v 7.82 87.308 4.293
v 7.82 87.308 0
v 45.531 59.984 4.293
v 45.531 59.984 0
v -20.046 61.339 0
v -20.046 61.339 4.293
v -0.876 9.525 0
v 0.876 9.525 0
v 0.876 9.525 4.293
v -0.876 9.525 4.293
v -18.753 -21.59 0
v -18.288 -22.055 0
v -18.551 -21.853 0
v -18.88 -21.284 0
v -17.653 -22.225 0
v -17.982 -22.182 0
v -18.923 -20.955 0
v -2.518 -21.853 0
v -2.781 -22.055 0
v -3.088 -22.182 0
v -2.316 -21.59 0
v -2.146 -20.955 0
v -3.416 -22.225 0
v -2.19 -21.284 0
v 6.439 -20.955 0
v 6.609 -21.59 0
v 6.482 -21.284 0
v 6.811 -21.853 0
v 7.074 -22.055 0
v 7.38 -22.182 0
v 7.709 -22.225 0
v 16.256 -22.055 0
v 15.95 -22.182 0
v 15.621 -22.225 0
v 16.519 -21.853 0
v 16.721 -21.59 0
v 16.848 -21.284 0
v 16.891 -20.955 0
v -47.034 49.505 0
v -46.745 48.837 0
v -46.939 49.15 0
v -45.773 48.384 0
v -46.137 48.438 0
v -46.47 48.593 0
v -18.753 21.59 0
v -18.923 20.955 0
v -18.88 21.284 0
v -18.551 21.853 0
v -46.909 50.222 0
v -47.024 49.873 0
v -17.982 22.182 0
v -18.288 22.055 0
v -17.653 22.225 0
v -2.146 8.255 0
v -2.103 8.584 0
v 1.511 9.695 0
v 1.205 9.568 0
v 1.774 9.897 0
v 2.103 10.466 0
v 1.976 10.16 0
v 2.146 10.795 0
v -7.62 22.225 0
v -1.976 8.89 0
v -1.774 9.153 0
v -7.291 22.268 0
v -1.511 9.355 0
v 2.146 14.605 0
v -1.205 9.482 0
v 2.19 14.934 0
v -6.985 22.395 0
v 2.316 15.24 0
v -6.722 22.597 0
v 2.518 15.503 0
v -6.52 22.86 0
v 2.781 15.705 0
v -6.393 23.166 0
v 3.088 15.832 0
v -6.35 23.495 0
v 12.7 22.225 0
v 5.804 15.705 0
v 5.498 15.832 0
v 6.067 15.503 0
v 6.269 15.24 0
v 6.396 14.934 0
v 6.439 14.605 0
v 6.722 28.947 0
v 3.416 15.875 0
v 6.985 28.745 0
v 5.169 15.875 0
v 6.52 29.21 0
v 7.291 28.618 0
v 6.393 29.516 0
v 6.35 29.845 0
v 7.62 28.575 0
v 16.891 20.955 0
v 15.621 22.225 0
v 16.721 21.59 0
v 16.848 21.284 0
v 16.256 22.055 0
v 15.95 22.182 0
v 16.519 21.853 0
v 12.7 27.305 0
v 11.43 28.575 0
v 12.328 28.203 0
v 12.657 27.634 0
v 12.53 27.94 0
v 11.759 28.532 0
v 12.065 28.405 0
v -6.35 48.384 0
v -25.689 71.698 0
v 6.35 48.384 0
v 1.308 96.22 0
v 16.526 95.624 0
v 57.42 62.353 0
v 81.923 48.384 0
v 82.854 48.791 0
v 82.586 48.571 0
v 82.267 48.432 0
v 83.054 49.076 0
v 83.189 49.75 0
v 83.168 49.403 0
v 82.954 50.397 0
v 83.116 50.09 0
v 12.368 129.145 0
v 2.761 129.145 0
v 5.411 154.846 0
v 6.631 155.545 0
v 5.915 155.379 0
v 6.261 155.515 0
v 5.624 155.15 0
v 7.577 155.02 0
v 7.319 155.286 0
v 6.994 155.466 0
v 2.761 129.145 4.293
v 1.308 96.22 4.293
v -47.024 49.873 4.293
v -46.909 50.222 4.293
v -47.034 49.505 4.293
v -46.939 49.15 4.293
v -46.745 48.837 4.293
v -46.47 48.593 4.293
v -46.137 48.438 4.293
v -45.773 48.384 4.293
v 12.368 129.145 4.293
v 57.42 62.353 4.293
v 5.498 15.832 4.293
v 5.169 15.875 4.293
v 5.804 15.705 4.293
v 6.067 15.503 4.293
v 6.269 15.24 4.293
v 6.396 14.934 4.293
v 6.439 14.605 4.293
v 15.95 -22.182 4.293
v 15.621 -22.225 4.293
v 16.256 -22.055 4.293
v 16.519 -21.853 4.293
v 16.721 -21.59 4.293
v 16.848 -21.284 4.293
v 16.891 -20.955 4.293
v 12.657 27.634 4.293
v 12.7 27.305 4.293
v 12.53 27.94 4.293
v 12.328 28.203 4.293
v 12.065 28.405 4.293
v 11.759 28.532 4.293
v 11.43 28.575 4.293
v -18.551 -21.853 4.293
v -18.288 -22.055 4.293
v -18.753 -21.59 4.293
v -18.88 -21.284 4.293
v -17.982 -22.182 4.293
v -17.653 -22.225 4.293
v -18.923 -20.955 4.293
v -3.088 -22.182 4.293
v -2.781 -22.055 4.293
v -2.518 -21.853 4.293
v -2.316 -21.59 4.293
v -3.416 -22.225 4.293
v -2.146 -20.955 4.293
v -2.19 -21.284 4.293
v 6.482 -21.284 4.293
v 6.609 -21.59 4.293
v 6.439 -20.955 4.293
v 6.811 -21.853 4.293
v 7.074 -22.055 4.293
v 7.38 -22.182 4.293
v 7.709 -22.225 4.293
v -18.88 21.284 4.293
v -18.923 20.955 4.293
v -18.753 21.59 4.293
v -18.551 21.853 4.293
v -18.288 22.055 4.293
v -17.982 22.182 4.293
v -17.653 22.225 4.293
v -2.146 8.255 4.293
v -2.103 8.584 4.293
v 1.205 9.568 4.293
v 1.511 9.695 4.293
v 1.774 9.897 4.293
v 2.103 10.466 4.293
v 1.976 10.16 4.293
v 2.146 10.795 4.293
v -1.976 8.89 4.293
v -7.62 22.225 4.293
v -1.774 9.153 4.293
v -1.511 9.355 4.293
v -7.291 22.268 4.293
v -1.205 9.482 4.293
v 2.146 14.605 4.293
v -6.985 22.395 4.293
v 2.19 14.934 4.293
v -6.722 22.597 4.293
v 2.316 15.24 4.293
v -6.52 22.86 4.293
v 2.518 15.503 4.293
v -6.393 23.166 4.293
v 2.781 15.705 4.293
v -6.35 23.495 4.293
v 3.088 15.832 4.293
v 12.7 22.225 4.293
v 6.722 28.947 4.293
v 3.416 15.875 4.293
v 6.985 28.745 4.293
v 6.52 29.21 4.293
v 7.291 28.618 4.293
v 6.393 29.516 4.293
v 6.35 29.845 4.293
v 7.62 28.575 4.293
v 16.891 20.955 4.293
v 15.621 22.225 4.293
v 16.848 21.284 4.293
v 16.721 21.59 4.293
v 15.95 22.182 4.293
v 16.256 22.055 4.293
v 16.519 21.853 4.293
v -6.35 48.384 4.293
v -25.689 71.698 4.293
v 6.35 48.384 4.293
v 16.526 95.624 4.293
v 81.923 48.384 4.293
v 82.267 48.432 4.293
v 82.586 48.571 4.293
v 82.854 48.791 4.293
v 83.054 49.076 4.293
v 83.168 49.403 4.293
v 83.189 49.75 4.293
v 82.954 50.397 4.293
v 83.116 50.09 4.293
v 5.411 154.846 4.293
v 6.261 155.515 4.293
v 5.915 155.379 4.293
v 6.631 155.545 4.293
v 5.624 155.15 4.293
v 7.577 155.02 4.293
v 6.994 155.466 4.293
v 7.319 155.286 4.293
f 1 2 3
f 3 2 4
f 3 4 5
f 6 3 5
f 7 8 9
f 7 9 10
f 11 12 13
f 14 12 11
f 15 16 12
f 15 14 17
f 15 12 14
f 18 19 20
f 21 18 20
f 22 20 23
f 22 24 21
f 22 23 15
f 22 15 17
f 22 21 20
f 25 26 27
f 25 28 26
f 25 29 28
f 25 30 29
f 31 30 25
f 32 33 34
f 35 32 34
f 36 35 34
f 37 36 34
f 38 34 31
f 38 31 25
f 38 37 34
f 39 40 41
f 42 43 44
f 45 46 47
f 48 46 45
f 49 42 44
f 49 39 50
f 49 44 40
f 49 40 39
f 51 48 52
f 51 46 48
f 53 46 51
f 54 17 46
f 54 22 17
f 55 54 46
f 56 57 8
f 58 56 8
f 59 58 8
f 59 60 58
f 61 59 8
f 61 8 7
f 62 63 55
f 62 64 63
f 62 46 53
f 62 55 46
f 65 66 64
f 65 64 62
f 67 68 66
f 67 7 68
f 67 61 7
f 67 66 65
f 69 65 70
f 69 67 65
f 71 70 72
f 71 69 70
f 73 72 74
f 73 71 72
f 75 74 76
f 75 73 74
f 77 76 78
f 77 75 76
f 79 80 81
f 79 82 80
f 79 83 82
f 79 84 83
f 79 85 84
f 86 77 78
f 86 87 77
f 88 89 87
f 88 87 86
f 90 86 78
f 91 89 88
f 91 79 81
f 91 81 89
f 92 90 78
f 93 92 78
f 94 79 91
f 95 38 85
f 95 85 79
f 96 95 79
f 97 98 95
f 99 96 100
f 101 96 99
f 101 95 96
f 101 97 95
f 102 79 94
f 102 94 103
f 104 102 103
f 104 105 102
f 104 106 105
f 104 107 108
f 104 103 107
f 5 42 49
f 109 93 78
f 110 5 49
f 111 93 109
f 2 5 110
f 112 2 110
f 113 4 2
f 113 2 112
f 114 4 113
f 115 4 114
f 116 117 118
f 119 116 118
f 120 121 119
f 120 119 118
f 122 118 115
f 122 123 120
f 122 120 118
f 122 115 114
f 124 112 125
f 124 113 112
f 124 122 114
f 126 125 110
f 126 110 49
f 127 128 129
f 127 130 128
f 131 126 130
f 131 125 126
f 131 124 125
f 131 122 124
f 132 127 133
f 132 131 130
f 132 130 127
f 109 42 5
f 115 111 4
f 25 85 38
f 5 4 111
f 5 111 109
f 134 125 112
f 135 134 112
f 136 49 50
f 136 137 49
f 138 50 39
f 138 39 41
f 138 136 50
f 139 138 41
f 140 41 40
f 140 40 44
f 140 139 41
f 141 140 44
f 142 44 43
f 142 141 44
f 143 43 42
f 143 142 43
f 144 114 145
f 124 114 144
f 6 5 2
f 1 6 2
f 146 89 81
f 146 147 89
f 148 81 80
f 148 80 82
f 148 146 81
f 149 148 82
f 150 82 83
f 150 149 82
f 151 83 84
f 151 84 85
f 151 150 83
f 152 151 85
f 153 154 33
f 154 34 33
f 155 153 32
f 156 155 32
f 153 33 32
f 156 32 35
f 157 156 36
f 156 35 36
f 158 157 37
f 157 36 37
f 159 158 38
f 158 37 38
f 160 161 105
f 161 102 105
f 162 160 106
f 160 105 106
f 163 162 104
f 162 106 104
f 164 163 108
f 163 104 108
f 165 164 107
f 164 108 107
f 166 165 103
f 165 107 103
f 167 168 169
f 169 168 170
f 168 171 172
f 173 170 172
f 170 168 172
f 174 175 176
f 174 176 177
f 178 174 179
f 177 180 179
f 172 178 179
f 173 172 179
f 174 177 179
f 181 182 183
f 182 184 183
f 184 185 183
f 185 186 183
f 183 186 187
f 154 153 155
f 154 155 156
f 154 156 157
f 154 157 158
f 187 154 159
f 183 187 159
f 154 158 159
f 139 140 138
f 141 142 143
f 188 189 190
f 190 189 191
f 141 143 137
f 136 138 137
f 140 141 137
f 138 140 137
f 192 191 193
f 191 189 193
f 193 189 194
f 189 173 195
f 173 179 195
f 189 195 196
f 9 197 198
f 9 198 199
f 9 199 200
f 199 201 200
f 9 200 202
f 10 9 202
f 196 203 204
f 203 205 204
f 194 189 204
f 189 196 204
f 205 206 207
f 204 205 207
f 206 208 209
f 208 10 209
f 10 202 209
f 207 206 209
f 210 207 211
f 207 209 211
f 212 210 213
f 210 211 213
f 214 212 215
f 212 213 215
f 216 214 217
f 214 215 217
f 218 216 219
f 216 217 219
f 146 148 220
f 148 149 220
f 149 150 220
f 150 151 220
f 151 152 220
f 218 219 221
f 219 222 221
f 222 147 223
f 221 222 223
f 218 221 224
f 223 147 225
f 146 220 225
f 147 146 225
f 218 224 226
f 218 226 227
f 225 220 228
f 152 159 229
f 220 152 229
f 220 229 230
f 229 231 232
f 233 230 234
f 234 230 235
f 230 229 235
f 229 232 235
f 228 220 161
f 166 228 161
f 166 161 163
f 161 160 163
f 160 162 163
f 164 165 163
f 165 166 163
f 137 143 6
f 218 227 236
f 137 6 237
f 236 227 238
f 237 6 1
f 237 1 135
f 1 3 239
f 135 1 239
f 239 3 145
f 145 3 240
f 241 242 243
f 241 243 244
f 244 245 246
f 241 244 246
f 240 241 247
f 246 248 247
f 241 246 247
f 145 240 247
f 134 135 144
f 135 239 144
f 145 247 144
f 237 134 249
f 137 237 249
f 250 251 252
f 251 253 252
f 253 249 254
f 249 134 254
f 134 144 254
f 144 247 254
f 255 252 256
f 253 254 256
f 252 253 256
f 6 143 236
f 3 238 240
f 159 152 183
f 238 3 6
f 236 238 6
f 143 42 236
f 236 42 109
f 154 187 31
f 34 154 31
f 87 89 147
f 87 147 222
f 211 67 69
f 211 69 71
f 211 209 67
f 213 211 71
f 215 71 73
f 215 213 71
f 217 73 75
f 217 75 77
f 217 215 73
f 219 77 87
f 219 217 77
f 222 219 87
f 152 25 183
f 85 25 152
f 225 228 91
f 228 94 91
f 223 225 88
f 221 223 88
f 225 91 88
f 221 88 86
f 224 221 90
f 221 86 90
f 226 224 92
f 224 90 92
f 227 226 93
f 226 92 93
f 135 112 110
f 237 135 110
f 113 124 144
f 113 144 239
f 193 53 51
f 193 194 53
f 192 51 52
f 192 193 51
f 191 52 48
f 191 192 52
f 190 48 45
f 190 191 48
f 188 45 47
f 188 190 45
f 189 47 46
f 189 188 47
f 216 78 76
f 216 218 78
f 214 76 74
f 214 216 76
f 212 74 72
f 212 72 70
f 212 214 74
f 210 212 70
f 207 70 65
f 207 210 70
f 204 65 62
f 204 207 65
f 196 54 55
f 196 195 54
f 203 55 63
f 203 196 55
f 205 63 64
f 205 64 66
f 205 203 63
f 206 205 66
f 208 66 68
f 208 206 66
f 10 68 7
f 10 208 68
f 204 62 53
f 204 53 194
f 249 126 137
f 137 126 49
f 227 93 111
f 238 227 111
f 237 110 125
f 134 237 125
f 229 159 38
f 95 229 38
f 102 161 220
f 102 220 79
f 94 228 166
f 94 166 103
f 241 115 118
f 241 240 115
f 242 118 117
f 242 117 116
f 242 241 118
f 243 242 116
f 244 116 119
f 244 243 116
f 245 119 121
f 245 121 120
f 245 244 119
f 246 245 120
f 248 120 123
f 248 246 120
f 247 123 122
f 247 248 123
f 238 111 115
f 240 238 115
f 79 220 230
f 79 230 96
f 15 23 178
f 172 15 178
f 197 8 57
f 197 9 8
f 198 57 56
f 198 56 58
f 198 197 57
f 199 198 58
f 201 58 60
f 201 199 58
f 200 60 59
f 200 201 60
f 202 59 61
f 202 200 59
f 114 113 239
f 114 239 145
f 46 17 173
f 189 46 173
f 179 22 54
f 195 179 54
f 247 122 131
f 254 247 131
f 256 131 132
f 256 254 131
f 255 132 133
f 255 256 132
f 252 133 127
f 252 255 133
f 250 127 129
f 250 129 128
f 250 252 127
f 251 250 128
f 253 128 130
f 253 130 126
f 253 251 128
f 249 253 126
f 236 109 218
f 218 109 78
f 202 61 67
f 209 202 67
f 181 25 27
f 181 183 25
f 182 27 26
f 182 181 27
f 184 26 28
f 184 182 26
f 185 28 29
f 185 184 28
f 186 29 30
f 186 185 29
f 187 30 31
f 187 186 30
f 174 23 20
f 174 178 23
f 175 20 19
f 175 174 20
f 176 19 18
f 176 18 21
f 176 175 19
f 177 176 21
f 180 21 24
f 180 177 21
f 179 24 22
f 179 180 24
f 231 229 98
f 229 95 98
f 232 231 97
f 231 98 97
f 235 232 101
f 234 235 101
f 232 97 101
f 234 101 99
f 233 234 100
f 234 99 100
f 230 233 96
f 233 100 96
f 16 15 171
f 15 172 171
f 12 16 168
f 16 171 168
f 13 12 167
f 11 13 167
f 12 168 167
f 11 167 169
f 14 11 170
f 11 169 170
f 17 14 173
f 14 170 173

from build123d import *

# Parameters (mm, degrees)
BOSS_EXTRUDE2_DEPTH = 4.2926
BOSS_EXTRUDE3_DEPTH = 4.2926
SKETCH5_W           = 4.2926
SKETCH5_H           = 31.75
CUT_EXTRUDE2_DEPTH  = 4.2926
SKETCH6_W           = 4.2926
SKETCH6_H           = 38.1
CUT_EXTRUDE3_DEPTH  = 4.2926
SKETCH9_W           = 4.2926
SKETCH9_H           = 44.45
BOSS_EXTRUDE4_DEPTH = 6.35
SKETCH10_W          = 4.2926
SKETCH10_H          = 6.35
BOSS_EXTRUDE5_DEPTH = 6.35
SKETCH12_W          = 4.2926
SKETCH12_H          = 44.45
BOSS_EXTRUDE6_DEPTH = 8.382
FILLET4_R           = 1.27
CUT_EXTRUDE1_DEPTH  = 4.2926


with BuildPart() as part:
    # Sketch2 → Boss-Extrude2 (new body)
    with BuildSketch(Plane.XY):
        Polygon((-47.828182898, 48.384354874), (-6.35, 48.384354874), (-6.35, 22.225), (-10.541, 22.225), (-10.541, -22.225), (10.541, -22.225), (10.541, 22.225), (6.35, 22.225), (6.35, 48.384354874), (84.403334241, 48.384354874), (6.35, 156.723399657), align=None)
    extrude(amount=BOSS_EXTRUDE2_DEPTH)

    # Sketch2<3> → Boss-Extrude3 (add)
    with BuildSketch(Plane.XY):
        Polygon((-6.35, 101.6), (6.35, 101.6), (6.35, 156.723399657), (-47.828182898, 48.384354874), (-6.35, 48.384354874), align=None)
    extrude(amount=BOSS_EXTRUDE3_DEPTH)

    # Sketch5 → Cut-Extrude2 (cut)
    with BuildSketch(Plane(origin=(0, 0, 0), x_dir=(-1, 0, 0), z_dir=(0, 0, -1))):
        with Locations((0, -6.35)):
            Rectangle(SKETCH5_W, SKETCH5_H)
    extrude(amount=-CUT_EXTRUDE2_DEPTH, mode=Mode.SUBTRACT)

    # Sketch6 → Cut-Extrude3 (cut)
    with BuildSketch(Plane(origin=(0, 0, 0), x_dir=(-1, 0, 0), z_dir=(0, 0, -1))):
        with Locations((-4.2926, -3.175)):
            Rectangle(SKETCH6_W, SKETCH6_H)
    extrude(amount=-CUT_EXTRUDE3_DEPTH, mode=Mode.SUBTRACT)

    # Sketch9 → Boss-Extrude4 (add)
    with BuildSketch(Plane(origin=(10.541, 0, 0), x_dir=(0, 0, -1), z_dir=(1, 0, 0))):
        with Locations((-2.1463, 0)):
            Rectangle(SKETCH9_W, SKETCH9_H)
    extrude(amount=BOSS_EXTRUDE4_DEPTH)

    # Sketch10 → Boss-Extrude5 (add)
    with BuildSketch(Plane(origin=(6.35, 0, 0), x_dir=(0, 0, -1), z_dir=(1, 0, 0))):
        with Locations((-2.1463, 25.4)):
            Rectangle(SKETCH10_W, SKETCH10_H)
    extrude(amount=BOSS_EXTRUDE5_DEPTH)

    # Sketch12 → Boss-Extrude6 (add)
    with BuildSketch(Plane.ZY.offset(10.541)):
        with Locations((2.1463, 0)):
            Rectangle(SKETCH12_W, SKETCH12_H)
    extrude(amount=BOSS_EXTRUDE6_DEPTH)

    # Fillet4
    fillet4_edges = [part.edges().sort_by_distance(p)[0] for p in [
        (6.4389, 15.875, 2.1463),
        (2.1463, 15.875, 2.1463),
        (-2.1463, 9.525, 2.1463),
        (2.1463, 9.525, 2.1463),
        (-6.35, 22.225, 2.1463),
        (-2.1463, -22.225, 2.1463),
        (6.4389, -22.225, 2.1463),
        (16.891, -22.225, 2.1463),
        (16.891, 22.225, 2.1463),
        (6.35, 28.575, 2.1463),
        (12.7, 28.575, 2.1463),
        (-18.923, -22.225, 2.1463),
        (-18.923, 22.225, 2.1463),
        (6.35, 156.723399657, 2.1463),
        (-47.828182898, 48.384354874, 2.1463),
        (84.403334241, 48.384354874, 2.1463),
    ]]
    fillet(fillet4_edges, radius=FILLET4_R)

    # Sketch4 → Cut-Extrude1 (cut)
    with BuildSketch(Plane(origin=(0, 0, 0), x_dir=(-1, 0, 0), z_dir=(0, 0, -1))):
        Polygon((-2.761203873, 129.144568559), (-1.308492387, 96.220137091), (25.689356606, 71.698449698), align=None)
        Polygon((-12.368070704, 129.144568559), (-16.525699657, 95.623732399), (-57.420105949, 62.352675196), align=None)
        Polygon((-7.819762817, 87.308153563), (-45.531165478, 59.983677251), (20.045786345, 61.339421803), align=None)
    extrude(amount=-CUT_EXTRUDE1_DEPTH, mode=Mode.SUBTRACT)


solid = part.part
